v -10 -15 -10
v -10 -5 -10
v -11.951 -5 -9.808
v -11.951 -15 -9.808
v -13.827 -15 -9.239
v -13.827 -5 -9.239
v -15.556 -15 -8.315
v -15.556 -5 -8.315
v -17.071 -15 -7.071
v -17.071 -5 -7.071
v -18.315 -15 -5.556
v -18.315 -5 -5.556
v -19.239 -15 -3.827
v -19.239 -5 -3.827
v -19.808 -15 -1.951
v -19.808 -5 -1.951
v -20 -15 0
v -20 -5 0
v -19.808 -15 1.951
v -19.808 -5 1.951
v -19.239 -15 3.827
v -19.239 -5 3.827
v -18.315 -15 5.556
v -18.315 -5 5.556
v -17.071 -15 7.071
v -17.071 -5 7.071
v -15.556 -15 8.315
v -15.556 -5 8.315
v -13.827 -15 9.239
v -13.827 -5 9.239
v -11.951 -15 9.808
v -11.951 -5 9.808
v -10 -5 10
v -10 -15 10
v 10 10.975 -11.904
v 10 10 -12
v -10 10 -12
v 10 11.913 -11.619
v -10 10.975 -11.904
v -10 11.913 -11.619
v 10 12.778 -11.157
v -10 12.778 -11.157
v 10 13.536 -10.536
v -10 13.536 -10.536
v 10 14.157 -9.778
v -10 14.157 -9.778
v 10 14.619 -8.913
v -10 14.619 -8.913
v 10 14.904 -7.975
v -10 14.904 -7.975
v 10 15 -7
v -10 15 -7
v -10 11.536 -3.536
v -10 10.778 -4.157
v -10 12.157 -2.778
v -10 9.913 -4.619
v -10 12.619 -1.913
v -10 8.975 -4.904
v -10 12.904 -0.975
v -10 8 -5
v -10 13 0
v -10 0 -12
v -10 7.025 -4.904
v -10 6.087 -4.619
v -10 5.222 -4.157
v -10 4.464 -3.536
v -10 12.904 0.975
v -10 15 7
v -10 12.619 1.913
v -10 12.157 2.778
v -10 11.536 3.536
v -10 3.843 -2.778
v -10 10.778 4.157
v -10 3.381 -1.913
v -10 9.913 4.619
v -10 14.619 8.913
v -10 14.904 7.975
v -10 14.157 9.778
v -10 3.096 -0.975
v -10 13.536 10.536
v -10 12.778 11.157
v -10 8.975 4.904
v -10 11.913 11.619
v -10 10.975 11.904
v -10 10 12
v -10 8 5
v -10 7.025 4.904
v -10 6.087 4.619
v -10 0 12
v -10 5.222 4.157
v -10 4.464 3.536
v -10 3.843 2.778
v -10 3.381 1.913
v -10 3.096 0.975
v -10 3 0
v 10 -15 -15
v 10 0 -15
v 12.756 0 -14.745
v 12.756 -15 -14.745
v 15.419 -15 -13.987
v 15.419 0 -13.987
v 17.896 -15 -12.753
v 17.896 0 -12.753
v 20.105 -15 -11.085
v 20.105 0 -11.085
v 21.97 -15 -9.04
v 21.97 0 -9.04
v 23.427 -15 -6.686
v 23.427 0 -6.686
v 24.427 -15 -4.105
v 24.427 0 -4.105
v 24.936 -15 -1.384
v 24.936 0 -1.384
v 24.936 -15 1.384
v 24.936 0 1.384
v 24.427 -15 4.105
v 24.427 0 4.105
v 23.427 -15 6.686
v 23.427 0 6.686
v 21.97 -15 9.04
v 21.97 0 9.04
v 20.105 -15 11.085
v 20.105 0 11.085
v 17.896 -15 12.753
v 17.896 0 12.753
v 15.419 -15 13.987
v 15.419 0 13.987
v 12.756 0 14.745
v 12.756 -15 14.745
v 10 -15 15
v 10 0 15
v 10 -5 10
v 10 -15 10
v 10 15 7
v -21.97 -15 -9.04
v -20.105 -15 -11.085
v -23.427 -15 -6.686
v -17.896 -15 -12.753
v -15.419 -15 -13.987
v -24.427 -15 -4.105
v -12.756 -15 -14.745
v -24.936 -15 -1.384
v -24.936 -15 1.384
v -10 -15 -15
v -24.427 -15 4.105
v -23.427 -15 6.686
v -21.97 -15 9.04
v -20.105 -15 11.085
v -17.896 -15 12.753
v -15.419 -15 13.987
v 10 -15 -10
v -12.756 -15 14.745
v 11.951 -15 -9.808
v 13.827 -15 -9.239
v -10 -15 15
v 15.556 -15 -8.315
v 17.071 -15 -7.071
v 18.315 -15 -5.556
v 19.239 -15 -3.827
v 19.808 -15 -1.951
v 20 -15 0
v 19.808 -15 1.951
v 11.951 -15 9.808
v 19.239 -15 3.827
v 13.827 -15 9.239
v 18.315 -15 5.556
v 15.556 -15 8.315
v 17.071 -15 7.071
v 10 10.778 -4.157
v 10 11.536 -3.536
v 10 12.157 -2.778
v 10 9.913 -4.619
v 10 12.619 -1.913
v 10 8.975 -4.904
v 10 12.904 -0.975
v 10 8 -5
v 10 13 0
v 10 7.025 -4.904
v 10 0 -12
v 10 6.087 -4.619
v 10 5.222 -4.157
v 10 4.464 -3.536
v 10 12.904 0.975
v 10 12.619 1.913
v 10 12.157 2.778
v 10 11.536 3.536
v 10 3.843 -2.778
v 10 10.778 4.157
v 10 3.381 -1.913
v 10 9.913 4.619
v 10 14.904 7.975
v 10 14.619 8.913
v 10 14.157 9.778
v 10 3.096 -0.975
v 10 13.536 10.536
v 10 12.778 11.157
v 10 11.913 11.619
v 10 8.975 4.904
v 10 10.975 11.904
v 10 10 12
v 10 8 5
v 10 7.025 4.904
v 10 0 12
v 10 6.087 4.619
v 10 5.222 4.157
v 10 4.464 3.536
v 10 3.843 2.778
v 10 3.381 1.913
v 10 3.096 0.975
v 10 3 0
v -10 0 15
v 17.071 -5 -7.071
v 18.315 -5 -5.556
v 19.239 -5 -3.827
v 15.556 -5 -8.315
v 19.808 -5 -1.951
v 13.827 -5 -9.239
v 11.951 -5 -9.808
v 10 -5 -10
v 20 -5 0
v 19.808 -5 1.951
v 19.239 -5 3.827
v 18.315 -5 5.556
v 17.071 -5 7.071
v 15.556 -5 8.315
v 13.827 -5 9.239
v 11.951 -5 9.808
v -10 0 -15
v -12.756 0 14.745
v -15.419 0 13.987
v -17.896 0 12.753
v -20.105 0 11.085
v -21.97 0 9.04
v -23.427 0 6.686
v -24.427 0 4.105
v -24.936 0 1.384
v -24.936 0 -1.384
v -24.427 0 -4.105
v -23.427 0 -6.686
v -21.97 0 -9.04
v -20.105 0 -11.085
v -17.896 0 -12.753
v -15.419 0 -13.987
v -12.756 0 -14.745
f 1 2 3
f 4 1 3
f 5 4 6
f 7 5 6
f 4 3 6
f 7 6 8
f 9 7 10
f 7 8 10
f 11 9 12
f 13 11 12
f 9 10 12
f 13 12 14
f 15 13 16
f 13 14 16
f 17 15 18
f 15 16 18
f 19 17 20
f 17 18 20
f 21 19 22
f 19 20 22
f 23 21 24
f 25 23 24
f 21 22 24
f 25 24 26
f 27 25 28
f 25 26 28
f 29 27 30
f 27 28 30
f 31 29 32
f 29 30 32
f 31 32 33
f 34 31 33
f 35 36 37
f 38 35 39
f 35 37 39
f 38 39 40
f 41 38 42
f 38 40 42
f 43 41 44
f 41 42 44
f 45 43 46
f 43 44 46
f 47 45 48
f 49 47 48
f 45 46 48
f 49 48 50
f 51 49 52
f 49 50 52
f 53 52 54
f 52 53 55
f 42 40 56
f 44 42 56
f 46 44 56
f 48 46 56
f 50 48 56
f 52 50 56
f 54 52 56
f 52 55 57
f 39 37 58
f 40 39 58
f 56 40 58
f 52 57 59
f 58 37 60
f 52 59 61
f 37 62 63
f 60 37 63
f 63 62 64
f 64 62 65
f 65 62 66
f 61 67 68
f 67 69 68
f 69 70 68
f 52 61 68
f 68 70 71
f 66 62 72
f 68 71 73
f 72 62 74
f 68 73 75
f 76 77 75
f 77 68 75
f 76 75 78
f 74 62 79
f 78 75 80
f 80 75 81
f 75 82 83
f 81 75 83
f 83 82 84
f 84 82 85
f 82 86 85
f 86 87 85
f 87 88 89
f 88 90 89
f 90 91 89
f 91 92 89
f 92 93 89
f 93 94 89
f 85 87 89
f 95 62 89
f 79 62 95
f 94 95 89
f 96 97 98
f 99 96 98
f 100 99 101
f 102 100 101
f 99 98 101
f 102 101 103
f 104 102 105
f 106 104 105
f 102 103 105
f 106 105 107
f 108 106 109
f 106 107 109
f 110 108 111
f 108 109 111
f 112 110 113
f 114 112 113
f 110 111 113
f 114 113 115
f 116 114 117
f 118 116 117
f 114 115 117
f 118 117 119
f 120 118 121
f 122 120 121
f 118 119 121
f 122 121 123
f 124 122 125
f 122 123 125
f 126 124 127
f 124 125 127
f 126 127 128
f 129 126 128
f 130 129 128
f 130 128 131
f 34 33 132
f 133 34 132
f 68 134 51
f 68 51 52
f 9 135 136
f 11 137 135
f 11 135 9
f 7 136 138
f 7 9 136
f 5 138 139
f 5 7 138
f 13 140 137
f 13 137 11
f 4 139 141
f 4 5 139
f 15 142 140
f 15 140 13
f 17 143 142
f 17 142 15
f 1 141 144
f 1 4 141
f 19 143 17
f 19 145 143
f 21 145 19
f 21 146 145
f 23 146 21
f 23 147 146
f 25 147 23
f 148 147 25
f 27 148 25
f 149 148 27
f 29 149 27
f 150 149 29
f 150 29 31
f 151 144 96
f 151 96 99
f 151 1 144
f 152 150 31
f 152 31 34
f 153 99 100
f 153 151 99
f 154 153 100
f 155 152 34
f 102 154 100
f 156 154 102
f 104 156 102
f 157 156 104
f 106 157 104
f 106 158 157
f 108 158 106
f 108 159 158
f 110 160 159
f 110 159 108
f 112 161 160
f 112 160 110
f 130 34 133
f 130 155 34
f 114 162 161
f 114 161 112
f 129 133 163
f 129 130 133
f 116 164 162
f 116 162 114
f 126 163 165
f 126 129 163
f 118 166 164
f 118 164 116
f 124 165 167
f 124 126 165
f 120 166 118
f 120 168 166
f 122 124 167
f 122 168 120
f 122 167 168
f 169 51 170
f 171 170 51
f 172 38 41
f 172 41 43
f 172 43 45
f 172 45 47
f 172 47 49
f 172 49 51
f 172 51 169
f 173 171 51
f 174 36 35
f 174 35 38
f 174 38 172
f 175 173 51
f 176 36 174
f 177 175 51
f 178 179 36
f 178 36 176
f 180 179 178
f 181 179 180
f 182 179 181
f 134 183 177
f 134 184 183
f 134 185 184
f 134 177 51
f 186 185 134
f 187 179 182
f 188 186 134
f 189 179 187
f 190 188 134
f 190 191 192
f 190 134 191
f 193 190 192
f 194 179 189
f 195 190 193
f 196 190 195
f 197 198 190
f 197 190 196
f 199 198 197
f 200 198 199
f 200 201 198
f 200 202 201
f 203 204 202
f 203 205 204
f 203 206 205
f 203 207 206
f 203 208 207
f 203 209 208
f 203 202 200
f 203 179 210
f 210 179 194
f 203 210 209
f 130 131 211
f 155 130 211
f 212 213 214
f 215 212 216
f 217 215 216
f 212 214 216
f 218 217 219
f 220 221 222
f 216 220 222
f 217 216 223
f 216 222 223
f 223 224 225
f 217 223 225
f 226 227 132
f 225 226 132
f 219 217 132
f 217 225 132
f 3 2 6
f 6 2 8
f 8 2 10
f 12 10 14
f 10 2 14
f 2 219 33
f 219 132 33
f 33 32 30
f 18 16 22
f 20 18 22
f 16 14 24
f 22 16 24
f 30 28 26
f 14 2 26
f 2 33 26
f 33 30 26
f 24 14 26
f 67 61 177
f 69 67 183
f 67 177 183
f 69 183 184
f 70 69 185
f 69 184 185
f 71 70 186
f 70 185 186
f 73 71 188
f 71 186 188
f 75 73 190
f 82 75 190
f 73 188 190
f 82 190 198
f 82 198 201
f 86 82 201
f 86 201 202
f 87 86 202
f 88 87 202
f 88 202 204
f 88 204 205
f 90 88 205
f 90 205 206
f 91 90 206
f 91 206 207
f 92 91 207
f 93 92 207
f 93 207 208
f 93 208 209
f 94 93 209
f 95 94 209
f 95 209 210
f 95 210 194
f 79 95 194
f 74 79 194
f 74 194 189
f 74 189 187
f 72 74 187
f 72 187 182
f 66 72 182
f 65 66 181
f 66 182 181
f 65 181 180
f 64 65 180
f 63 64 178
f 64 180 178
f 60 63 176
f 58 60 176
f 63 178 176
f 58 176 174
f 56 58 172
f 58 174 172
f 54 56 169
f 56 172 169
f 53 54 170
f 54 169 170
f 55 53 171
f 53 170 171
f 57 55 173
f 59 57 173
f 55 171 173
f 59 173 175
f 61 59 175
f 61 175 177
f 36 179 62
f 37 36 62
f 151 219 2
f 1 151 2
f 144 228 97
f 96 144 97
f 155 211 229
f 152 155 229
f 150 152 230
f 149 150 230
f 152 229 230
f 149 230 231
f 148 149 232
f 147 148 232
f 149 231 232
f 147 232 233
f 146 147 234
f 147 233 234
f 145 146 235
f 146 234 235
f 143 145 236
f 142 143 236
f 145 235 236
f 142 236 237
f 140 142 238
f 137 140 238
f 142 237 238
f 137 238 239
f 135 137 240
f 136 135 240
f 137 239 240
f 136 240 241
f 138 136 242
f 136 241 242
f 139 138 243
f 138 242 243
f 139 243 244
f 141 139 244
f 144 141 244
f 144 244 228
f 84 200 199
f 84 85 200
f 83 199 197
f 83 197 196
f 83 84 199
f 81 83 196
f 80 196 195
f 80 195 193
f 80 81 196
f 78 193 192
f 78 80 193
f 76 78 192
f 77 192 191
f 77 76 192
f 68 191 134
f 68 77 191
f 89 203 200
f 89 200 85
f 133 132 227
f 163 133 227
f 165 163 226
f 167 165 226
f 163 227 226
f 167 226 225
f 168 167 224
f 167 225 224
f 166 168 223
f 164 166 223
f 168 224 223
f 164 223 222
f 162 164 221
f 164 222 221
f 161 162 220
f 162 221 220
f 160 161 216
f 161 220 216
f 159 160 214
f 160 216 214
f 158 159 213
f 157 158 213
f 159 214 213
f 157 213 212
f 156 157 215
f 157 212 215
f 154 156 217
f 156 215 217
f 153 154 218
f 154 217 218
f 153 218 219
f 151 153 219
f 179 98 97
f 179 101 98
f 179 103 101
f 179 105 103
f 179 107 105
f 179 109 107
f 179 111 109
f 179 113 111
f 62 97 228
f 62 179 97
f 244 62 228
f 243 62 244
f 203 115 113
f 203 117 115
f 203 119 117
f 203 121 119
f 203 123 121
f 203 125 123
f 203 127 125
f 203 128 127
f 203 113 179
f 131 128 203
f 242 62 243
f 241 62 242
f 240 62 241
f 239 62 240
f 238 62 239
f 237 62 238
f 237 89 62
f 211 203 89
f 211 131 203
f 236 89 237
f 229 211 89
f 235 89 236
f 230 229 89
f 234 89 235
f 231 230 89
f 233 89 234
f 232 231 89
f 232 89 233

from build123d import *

# Parameters (mm, degrees)
F1_DEPTH = 15
F3_DEPTH = 5
F4_W     = 20
F4_H     = 24
F5_DEPTH = 15
F6_R     = 5
F7_R     = 5
F8_DEPTH = 25


with BuildPart() as f1:
    # F0 (on Front) → F1 (new body)
    with BuildSketch(Plane.XZ):
        with BuildLine():
            Line((-10, -15), (10, -15))
            ThreePointArc((10, -15), (25, 0), (10, 15))
            Line((10, 15), (-10, 15))
            ThreePointArc((-10, 15), (-25, 0), (-10, -15))
        make_face()
        with BuildLine():
            ThreePointArc((-10, -10), (-20, 0), (-10, 10))
            Line((-10, 10), (10, 10))
            ThreePointArc((10, 10), (20, 0), (10, -10))
            Line((10, -10), (-10, -10))
        make_face(mode=Mode.SUBTRACT)
    extrude(amount=F1_DEPTH)

    # F2 (on face) → F3 (join)
    with BuildSketch(Plane(origin=(0, 0, 0), x_dir=(-1, 0, 0), z_dir=(0, 1, 0))):
        with BuildLine():
            ThreePointArc((10, -10), (20, 0), (10, 10))
            Line((10, 10), (-10, 10))
            ThreePointArc((-10, 10), (-20, 0), (-10, -10))
            Line((-10, -10), (10, -10))
        make_face()
    extrude(amount=-F3_DEPTH)

    # F4 (on face) → F5 (join)
    with BuildSketch(Plane(origin=(0, 0, 0), x_dir=(-1, 0, 0), z_dir=(0, 1, 0))):
        Rectangle(F4_W, F4_H)
    extrude(amount=F5_DEPTH)

    # F6
    f6_edges = [f1.edges().sort_by_distance(p)[0] for p in [
        (0, 15, -12),
        (0, 15, 12),
    ]]
    fillet(f6_edges, radius=F6_R)

    # F7 (on face) → F8 (cut)
    with BuildSketch(Plane.YZ.offset(10)):
        with Locations((8, 0)):
            Circle(F7_R)
    extrude(amount=-F8_DEPTH, mode=Mode.SUBTRACT)


solid = f1.part
